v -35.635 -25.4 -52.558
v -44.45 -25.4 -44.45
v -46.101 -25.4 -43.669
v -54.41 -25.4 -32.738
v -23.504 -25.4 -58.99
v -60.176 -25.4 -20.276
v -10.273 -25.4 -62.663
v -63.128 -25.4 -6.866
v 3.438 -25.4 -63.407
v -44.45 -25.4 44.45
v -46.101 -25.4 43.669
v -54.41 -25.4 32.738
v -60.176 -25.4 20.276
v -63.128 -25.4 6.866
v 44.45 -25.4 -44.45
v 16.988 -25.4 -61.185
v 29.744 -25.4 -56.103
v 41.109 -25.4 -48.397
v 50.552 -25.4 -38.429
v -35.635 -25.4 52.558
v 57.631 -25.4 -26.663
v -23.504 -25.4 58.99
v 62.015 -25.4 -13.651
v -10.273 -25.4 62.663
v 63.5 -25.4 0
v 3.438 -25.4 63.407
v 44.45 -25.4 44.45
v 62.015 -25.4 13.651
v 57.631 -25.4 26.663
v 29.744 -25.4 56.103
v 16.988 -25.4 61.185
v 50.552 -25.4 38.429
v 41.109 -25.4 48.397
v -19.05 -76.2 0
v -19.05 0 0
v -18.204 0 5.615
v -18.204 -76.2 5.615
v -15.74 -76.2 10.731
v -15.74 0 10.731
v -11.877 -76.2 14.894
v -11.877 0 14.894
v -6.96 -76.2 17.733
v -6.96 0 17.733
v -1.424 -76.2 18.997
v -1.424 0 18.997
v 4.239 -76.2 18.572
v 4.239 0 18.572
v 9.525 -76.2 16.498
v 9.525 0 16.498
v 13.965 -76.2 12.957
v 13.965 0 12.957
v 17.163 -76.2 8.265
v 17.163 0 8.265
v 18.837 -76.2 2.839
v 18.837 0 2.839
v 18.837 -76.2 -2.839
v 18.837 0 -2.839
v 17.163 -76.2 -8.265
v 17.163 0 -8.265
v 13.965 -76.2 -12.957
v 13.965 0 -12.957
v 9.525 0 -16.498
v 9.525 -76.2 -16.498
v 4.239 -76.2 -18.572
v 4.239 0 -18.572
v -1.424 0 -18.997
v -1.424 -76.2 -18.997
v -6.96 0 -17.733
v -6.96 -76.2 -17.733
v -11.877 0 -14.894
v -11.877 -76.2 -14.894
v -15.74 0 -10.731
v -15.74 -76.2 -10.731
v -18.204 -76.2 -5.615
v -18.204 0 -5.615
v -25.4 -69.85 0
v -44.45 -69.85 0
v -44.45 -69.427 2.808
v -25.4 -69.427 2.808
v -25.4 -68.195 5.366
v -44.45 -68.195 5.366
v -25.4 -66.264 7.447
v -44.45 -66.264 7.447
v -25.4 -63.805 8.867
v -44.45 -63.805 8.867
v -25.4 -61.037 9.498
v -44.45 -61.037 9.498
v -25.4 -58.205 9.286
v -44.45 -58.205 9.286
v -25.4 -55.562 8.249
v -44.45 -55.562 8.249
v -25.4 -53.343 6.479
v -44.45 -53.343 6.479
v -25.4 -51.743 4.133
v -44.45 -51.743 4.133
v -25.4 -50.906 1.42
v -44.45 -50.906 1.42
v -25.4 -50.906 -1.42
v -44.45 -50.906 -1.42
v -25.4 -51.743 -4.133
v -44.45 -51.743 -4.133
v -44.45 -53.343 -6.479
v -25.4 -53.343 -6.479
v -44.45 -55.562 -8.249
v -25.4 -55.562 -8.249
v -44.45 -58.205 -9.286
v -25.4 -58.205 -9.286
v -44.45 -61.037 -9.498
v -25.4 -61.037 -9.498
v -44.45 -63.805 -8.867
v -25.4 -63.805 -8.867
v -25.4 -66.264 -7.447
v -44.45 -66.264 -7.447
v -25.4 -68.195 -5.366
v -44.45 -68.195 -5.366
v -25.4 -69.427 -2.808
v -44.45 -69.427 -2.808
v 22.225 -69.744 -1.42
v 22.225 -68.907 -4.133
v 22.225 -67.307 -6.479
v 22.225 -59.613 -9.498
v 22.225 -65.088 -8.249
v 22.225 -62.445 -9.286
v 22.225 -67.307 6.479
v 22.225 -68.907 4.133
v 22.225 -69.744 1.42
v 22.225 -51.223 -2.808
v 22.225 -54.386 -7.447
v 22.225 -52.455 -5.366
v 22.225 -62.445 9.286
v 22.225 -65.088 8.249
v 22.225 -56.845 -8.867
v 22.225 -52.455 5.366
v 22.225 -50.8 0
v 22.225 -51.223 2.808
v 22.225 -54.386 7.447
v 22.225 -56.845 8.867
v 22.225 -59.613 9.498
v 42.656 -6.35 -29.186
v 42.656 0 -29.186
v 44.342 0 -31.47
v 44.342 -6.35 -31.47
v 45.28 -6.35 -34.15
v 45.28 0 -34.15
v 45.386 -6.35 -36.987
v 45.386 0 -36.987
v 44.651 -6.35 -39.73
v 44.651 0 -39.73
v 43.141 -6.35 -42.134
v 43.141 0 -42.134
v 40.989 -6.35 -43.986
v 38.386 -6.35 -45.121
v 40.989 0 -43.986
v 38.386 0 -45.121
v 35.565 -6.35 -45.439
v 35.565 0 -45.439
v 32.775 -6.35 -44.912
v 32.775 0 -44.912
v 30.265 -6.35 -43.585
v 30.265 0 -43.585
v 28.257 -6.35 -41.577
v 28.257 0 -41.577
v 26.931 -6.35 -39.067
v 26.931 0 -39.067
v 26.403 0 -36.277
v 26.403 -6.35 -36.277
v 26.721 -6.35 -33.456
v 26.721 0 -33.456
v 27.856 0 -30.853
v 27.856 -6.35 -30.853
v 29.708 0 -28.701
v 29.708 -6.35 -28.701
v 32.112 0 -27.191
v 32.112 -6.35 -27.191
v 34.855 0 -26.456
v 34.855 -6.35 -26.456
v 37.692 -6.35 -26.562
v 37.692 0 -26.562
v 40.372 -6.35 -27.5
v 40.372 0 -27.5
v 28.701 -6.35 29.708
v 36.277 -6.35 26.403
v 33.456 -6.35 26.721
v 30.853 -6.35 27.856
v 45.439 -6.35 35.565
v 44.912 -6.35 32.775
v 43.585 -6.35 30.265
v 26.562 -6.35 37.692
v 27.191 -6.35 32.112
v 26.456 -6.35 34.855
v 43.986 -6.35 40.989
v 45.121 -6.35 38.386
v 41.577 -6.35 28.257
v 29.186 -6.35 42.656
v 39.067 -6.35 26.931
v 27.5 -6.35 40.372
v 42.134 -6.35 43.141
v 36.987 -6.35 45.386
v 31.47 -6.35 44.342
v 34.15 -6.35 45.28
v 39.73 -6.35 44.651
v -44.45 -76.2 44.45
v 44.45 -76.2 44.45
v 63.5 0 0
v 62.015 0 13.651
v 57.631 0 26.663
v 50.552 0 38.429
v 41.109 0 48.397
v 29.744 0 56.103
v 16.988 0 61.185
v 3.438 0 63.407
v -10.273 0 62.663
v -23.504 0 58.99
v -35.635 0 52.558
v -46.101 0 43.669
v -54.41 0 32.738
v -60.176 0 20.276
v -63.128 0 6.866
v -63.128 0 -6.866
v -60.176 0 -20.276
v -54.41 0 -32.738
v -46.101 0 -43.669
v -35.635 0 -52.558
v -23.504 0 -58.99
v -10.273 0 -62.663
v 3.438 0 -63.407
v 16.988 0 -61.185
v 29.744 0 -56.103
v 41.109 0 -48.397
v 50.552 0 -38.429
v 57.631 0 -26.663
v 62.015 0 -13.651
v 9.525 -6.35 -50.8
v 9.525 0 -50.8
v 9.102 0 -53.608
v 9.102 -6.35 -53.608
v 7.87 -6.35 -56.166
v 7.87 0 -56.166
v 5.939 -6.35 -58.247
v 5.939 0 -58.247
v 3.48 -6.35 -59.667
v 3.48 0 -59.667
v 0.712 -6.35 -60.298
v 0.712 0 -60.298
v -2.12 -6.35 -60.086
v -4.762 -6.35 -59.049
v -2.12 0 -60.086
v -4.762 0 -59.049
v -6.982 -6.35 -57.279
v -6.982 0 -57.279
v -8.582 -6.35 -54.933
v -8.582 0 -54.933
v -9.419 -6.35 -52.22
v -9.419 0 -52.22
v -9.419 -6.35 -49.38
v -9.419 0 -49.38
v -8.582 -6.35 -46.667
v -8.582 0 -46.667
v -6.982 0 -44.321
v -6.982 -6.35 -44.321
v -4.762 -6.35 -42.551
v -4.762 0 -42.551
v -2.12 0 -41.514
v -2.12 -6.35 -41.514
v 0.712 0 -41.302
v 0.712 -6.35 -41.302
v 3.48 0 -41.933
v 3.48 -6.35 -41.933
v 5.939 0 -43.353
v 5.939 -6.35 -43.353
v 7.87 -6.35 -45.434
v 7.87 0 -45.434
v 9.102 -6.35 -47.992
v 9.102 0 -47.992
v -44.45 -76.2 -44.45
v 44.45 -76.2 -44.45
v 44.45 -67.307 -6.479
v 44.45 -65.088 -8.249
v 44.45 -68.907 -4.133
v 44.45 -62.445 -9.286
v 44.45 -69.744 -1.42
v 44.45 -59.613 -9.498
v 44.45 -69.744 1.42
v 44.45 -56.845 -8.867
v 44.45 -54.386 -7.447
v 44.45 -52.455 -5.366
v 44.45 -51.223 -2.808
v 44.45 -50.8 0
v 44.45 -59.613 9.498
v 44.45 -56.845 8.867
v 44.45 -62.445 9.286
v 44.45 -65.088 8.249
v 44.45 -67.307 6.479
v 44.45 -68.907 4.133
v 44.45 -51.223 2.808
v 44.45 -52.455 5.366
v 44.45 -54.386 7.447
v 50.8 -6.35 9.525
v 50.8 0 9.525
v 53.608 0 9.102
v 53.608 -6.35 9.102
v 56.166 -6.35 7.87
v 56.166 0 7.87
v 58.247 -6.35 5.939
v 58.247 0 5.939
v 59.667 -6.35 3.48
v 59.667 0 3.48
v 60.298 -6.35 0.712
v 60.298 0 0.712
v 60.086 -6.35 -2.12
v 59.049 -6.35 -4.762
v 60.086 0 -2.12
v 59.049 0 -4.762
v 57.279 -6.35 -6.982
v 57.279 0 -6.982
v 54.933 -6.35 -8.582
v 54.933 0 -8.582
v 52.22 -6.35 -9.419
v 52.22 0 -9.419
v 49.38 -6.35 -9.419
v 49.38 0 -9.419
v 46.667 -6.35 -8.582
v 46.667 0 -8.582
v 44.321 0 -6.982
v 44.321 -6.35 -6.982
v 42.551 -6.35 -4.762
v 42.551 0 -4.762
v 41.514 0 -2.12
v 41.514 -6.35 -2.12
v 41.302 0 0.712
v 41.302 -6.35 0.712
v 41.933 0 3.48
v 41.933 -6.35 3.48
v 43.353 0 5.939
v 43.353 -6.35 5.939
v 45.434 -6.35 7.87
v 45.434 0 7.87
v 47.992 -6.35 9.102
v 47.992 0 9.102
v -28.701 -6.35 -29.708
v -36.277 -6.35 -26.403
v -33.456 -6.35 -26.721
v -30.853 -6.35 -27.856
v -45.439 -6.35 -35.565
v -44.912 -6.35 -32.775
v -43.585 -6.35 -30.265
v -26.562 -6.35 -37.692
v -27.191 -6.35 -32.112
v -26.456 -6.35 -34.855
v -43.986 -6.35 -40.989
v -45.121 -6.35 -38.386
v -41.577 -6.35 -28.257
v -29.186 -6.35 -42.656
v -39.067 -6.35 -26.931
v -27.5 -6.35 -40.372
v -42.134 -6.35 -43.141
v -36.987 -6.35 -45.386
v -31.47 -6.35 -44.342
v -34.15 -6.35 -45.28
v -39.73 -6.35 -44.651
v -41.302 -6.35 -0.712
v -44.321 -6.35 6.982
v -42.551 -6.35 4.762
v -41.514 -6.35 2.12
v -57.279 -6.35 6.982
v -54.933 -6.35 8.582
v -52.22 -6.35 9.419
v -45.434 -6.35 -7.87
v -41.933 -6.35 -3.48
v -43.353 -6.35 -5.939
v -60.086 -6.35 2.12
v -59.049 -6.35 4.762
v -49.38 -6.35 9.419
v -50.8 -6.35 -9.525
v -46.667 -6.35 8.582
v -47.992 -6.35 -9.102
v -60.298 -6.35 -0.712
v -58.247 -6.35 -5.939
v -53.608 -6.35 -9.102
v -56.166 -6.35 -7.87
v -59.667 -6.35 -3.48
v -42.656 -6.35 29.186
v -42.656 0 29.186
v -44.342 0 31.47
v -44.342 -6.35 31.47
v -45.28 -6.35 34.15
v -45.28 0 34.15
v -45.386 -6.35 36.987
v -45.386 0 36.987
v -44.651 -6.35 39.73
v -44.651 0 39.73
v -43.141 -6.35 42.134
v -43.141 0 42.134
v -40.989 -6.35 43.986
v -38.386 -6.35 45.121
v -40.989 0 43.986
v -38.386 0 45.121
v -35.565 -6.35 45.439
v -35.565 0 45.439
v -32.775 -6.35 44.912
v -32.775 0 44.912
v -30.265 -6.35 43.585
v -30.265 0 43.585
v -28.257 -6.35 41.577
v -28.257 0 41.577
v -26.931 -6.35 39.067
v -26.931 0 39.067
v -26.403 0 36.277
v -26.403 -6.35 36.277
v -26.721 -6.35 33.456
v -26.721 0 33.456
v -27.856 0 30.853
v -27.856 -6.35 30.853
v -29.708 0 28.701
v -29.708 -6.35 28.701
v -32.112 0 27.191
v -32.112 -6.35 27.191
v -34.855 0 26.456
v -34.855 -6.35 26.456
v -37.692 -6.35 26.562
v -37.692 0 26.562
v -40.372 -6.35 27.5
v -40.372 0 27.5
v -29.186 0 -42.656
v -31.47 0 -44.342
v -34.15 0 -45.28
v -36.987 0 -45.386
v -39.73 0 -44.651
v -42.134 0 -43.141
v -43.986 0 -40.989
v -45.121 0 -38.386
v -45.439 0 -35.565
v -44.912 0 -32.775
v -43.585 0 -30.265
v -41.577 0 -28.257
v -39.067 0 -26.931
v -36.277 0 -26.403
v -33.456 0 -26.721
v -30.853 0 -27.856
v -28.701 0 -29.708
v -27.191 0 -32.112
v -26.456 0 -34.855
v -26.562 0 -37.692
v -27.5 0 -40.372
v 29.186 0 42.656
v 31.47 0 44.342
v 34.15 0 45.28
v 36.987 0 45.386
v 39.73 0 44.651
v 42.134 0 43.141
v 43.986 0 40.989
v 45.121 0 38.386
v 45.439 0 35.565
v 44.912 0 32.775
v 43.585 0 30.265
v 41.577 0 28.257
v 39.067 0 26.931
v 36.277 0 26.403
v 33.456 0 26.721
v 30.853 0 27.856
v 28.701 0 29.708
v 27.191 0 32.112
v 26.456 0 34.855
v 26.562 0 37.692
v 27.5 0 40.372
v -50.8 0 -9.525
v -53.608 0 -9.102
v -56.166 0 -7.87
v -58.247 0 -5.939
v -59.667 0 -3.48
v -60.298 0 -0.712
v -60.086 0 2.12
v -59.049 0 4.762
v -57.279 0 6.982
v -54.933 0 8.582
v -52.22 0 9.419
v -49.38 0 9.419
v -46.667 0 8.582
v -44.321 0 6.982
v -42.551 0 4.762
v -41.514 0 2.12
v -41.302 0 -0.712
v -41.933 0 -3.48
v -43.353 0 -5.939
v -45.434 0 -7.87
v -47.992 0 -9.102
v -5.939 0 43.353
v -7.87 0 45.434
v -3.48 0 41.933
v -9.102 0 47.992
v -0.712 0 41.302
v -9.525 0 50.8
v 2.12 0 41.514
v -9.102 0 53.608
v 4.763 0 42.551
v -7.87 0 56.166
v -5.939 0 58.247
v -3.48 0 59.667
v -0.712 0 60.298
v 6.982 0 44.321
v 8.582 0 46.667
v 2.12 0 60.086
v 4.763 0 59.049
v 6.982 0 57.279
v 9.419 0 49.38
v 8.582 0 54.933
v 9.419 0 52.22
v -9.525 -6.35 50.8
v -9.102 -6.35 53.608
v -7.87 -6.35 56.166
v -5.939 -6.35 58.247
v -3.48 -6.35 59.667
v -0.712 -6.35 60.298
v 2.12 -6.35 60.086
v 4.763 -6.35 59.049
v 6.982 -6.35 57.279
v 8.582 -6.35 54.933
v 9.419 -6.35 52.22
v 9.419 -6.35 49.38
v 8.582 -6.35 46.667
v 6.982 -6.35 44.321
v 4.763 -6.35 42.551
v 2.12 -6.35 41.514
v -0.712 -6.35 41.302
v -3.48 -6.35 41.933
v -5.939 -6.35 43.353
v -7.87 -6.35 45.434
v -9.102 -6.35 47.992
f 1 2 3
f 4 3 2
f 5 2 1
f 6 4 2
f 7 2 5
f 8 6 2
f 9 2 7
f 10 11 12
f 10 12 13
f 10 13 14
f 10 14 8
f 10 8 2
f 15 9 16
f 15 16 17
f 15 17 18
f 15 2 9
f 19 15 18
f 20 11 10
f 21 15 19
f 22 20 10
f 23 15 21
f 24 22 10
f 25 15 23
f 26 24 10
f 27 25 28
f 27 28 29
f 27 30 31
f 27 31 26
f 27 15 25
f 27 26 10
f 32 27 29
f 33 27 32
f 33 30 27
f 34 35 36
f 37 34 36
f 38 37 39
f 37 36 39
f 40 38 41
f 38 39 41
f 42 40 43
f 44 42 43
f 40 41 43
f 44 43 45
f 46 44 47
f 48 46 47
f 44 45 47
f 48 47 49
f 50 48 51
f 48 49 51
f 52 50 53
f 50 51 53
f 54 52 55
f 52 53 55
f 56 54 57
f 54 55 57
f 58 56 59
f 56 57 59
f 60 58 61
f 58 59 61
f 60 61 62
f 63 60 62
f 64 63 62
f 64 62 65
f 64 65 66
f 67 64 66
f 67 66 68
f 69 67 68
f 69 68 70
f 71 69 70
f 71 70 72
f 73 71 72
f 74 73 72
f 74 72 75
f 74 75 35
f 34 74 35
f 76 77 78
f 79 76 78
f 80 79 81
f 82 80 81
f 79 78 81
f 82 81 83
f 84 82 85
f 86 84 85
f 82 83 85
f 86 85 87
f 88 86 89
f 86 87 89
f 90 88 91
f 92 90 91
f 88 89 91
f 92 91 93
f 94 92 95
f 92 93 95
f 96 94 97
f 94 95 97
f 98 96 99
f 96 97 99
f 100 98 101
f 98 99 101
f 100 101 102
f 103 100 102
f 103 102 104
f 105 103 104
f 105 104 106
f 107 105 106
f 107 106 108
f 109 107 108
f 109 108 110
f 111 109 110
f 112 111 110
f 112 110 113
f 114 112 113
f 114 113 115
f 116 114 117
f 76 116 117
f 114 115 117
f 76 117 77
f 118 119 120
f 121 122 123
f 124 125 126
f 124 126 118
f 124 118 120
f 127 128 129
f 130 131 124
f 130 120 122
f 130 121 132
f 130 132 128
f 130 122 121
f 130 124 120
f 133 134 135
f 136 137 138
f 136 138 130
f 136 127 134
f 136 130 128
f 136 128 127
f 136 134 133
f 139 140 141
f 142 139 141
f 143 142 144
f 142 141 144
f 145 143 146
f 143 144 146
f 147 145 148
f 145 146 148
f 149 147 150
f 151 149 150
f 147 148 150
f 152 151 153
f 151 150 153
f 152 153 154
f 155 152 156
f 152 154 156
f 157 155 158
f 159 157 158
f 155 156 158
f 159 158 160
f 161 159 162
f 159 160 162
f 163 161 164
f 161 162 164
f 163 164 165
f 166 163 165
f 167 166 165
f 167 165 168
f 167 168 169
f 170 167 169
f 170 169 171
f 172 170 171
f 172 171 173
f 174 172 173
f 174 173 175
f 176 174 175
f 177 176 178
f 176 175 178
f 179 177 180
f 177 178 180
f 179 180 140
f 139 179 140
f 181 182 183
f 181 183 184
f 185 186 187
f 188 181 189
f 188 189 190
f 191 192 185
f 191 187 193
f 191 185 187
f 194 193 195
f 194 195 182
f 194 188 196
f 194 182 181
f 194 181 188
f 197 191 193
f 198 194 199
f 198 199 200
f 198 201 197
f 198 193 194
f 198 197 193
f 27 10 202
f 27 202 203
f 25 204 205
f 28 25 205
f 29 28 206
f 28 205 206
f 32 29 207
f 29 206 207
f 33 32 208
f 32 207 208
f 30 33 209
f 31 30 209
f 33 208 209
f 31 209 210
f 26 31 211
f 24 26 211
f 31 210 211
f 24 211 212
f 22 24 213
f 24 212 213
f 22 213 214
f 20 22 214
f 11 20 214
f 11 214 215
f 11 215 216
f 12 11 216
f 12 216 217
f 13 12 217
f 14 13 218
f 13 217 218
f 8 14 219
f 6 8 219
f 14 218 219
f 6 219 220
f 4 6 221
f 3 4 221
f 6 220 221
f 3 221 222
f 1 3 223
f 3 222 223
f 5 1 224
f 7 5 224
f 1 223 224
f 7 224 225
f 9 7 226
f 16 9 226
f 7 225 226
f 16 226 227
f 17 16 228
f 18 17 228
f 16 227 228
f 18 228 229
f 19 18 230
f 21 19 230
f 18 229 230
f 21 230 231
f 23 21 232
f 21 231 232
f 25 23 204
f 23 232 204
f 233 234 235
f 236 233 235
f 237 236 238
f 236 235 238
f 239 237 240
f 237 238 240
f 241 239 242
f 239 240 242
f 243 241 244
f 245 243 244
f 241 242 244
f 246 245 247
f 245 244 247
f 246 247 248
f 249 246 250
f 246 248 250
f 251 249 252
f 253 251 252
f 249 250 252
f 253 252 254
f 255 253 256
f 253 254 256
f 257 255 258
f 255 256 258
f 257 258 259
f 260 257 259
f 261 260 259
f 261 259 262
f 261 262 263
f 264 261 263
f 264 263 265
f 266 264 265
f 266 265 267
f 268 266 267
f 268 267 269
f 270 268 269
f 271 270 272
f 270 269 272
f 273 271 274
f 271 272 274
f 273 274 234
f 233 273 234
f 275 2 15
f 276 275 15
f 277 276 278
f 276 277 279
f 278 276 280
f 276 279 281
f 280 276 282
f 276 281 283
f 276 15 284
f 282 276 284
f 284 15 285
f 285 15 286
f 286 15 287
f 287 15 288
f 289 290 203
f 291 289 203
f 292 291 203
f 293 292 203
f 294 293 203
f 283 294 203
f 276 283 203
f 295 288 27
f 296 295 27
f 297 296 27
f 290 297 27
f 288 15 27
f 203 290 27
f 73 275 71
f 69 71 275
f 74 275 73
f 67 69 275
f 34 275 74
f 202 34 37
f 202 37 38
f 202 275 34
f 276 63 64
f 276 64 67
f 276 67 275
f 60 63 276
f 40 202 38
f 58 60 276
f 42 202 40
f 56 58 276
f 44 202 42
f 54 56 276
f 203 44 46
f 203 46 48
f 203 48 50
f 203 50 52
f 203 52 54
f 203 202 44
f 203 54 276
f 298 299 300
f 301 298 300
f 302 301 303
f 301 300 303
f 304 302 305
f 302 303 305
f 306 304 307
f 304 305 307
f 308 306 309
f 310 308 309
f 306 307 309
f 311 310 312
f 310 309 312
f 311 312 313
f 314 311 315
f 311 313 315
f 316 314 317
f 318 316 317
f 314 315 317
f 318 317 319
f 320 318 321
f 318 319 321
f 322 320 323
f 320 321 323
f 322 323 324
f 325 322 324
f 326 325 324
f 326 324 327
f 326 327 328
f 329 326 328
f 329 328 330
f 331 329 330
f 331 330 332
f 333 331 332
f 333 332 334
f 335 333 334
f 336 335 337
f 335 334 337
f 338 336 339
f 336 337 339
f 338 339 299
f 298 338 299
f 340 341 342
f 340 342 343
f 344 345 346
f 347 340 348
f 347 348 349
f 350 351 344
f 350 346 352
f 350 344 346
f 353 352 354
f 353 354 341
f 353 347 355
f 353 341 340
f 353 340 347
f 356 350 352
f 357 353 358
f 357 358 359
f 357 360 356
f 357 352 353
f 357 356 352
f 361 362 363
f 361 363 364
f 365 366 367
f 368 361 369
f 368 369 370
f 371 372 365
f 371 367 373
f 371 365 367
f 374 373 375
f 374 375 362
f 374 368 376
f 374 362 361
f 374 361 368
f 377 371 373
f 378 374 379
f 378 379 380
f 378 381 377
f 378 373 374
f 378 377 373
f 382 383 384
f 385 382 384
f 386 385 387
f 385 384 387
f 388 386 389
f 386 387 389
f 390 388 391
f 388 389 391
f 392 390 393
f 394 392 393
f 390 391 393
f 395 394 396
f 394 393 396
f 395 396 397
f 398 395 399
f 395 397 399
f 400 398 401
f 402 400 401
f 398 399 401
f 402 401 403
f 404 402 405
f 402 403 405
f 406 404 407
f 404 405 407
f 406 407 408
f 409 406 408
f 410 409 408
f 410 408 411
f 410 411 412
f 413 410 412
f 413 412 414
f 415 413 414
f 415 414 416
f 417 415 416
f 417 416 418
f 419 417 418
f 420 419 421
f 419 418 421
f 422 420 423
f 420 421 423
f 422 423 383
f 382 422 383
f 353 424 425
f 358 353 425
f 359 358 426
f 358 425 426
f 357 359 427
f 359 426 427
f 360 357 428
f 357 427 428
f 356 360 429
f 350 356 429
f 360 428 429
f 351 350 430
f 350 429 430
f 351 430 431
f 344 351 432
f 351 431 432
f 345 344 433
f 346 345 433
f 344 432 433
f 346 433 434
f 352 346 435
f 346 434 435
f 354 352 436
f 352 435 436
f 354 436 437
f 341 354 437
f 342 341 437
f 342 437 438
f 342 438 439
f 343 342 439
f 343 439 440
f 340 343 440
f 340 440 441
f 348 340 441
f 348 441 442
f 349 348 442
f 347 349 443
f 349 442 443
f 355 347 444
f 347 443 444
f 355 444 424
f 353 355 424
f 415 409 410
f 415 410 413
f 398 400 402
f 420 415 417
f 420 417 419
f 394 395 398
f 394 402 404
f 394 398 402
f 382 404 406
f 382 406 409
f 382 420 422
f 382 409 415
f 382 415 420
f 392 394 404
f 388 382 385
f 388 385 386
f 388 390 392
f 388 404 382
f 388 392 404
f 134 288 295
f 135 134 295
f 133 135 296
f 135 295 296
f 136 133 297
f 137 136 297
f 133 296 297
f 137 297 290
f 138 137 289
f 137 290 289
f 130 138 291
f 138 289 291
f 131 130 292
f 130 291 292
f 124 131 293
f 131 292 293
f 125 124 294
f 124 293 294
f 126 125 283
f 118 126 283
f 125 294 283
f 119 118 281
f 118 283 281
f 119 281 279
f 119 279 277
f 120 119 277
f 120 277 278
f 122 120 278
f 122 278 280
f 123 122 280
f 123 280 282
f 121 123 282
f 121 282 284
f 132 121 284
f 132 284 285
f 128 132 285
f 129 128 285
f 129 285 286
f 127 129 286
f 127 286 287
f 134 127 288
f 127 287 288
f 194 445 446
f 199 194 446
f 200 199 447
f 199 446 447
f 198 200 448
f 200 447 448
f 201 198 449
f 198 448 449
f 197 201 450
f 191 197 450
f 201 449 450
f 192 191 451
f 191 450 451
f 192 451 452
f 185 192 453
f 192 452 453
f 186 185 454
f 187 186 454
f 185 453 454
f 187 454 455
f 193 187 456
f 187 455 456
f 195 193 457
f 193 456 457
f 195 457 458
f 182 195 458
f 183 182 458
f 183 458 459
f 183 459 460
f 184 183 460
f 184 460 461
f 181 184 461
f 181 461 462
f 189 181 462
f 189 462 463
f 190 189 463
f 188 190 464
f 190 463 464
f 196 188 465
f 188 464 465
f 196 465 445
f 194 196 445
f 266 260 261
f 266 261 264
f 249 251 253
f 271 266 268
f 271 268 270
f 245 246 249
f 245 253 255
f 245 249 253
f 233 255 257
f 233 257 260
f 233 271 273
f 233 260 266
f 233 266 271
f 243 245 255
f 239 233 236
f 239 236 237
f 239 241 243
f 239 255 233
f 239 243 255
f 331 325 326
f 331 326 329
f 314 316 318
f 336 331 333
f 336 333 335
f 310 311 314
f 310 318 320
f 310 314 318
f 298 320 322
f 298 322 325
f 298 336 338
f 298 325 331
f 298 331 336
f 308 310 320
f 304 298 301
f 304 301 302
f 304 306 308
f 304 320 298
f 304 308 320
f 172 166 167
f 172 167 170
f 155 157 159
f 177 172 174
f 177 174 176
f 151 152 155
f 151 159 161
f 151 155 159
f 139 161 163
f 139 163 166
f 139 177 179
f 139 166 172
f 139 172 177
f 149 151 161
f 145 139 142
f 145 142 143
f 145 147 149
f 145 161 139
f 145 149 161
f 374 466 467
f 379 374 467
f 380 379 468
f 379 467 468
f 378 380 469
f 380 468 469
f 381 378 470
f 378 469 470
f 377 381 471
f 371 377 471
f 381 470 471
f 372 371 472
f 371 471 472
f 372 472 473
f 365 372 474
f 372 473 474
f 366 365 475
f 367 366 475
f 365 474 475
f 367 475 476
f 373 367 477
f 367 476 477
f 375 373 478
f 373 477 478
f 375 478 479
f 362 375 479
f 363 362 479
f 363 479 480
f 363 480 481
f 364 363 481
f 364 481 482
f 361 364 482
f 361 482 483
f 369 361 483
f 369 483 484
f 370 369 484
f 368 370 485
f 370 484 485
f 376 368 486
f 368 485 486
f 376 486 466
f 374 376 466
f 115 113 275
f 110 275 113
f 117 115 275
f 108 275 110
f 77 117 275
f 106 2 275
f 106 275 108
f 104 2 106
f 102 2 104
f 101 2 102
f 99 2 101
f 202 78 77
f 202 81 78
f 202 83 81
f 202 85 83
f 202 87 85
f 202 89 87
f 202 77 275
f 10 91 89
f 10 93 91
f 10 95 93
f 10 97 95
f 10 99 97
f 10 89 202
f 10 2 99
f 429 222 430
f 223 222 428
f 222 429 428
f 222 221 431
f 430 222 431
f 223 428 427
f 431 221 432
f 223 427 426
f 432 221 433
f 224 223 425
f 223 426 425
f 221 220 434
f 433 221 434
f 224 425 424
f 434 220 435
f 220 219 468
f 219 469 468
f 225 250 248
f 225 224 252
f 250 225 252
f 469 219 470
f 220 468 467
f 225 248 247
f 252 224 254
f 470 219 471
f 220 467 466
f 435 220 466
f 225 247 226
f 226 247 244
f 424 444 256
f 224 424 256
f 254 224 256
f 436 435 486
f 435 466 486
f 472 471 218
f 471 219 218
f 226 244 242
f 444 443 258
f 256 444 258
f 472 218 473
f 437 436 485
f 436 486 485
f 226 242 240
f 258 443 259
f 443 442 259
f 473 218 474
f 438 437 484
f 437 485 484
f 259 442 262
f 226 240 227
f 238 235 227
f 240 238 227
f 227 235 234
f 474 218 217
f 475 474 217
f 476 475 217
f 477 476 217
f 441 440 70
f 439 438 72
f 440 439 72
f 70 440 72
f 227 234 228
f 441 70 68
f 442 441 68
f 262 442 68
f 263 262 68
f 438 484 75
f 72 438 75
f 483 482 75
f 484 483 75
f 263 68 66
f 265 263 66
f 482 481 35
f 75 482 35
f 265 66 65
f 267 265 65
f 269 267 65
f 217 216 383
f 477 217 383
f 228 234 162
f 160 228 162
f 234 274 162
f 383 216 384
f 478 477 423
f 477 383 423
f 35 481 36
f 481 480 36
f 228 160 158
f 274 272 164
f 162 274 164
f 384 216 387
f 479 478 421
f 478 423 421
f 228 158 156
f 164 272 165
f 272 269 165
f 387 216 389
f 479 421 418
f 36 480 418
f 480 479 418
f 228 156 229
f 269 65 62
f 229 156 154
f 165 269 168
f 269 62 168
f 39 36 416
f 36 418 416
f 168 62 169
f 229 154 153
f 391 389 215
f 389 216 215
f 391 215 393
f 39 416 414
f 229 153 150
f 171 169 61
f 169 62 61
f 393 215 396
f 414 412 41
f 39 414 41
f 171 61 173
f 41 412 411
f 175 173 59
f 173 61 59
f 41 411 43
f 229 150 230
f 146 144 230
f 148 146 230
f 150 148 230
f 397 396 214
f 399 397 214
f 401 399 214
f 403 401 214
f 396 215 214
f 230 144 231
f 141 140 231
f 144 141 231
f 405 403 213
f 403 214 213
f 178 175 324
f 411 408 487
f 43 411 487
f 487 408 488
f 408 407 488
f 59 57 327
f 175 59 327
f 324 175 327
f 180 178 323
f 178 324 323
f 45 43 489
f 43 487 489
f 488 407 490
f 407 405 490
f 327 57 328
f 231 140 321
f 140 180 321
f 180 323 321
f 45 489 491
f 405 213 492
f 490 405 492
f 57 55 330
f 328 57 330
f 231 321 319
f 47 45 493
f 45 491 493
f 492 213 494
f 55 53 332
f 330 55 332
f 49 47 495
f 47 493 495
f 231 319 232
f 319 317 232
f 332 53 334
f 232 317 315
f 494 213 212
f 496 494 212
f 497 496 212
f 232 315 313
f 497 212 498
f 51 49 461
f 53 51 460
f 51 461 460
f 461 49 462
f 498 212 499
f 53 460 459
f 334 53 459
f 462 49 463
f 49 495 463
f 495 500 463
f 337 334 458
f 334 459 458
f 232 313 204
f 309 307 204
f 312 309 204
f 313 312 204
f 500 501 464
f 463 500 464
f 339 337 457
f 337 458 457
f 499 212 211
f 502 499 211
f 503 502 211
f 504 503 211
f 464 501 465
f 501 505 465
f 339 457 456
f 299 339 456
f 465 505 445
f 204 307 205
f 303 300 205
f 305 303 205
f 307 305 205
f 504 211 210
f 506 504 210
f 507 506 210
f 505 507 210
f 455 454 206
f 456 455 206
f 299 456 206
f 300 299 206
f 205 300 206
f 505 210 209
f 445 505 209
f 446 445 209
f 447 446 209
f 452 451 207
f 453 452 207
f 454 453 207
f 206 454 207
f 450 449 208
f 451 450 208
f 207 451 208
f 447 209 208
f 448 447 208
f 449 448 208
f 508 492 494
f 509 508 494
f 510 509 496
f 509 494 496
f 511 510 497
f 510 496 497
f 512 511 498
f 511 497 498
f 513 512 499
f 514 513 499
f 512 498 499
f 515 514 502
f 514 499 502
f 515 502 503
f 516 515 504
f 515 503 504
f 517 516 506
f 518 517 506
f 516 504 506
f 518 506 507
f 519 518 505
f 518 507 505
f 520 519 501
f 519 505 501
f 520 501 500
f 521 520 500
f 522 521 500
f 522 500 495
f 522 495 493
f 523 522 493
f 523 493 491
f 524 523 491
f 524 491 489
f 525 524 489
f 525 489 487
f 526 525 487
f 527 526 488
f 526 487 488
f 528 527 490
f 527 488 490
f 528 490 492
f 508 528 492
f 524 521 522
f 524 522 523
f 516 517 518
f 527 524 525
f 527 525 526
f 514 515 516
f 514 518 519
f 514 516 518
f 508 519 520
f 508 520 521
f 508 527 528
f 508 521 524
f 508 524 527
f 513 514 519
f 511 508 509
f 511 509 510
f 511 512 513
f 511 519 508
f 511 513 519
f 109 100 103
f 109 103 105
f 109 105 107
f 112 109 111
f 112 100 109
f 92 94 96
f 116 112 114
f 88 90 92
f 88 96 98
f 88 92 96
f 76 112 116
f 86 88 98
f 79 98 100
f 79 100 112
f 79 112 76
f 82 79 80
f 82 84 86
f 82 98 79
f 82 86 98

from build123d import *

# Parameters (mm, degrees)
F0_R            = 63.5
F1_DEPTH        = 25.4
F2_R            = 9.525
F3_DEPTH        = 6.35
F3_COPIES_COUNT = 8
F5_W            = 88.9
F5_H            = 88.9
F6_DEPTH        = 50.8
F4_R            = 19.05
F7_DEPTH        = 101.6
F8_R            = 9.525
F9_DEPTH        = 22.225
F10_R           = 9.525
F11_DEPTH       = 19.05


# Not quite as in the source:
# - a pattern or mirror of a feature is missing from the dataset's text; its kind, count and spacing are read off the source's solid


with BuildPart() as f1:
    # F0 (on Front) → F1 (new body)
    with BuildSketch(Plane.XZ):
        Circle(F0_R)
    extrude(amount=F1_DEPTH)

    # F2 (on face) → F3 (cut)
    with BuildSketch(Plane(origin=(0, 0, 0), x_dir=(-1, 0, 0), z_dir=(0, 1, 0))):
        with Locations((0, 50.8)):
            Circle(F2_R)
    f3 = extrude(amount=-F3_DEPTH, mode=Mode.SUBTRACT)

    # F3_copies: F3 ×8 about axis
    f3_copies_axis = Axis((0, 0, 0), (0, 1, 0))
    for i in range(1, F3_COPIES_COUNT):
        add(f3.rotate(f3_copies_axis, i * 360 / F3_COPIES_COUNT), mode=Mode.SUBTRACT)

    # F5 (on face) → F6 (join)
    with BuildSketch(Plane.XZ.offset(25.4)):
        Rectangle(F5_W, F5_H)
    extrude(amount=F6_DEPTH)

    # F4 (on face) → F7 (cut)
    with BuildSketch(Plane(origin=(0, 0, 0), x_dir=(-1, 0, 0), z_dir=(0, 1, 0))):
        Circle(F4_R)
    extrude(amount=-F7_DEPTH, mode=Mode.SUBTRACT)

    # F8 (on face) → F9 (cut)
    with BuildSketch(Plane.YZ.offset(44.45)):
        with Locations((-60.325, 0)):
            Circle(F8_R)
    extrude(amount=-F9_DEPTH, mode=Mode.SUBTRACT)

    # F10 (on face) → F11 (cut)
    with BuildSketch(Plane(origin=(-44.45, 0, 0), x_dir=(0, -1, 0), z_dir=(-1, 0, 0))):
        with Locations((60.325, 0)):
            Circle(F10_R)
    extrude(amount=-F11_DEPTH, mode=Mode.SUBTRACT)


solid = f1.part
